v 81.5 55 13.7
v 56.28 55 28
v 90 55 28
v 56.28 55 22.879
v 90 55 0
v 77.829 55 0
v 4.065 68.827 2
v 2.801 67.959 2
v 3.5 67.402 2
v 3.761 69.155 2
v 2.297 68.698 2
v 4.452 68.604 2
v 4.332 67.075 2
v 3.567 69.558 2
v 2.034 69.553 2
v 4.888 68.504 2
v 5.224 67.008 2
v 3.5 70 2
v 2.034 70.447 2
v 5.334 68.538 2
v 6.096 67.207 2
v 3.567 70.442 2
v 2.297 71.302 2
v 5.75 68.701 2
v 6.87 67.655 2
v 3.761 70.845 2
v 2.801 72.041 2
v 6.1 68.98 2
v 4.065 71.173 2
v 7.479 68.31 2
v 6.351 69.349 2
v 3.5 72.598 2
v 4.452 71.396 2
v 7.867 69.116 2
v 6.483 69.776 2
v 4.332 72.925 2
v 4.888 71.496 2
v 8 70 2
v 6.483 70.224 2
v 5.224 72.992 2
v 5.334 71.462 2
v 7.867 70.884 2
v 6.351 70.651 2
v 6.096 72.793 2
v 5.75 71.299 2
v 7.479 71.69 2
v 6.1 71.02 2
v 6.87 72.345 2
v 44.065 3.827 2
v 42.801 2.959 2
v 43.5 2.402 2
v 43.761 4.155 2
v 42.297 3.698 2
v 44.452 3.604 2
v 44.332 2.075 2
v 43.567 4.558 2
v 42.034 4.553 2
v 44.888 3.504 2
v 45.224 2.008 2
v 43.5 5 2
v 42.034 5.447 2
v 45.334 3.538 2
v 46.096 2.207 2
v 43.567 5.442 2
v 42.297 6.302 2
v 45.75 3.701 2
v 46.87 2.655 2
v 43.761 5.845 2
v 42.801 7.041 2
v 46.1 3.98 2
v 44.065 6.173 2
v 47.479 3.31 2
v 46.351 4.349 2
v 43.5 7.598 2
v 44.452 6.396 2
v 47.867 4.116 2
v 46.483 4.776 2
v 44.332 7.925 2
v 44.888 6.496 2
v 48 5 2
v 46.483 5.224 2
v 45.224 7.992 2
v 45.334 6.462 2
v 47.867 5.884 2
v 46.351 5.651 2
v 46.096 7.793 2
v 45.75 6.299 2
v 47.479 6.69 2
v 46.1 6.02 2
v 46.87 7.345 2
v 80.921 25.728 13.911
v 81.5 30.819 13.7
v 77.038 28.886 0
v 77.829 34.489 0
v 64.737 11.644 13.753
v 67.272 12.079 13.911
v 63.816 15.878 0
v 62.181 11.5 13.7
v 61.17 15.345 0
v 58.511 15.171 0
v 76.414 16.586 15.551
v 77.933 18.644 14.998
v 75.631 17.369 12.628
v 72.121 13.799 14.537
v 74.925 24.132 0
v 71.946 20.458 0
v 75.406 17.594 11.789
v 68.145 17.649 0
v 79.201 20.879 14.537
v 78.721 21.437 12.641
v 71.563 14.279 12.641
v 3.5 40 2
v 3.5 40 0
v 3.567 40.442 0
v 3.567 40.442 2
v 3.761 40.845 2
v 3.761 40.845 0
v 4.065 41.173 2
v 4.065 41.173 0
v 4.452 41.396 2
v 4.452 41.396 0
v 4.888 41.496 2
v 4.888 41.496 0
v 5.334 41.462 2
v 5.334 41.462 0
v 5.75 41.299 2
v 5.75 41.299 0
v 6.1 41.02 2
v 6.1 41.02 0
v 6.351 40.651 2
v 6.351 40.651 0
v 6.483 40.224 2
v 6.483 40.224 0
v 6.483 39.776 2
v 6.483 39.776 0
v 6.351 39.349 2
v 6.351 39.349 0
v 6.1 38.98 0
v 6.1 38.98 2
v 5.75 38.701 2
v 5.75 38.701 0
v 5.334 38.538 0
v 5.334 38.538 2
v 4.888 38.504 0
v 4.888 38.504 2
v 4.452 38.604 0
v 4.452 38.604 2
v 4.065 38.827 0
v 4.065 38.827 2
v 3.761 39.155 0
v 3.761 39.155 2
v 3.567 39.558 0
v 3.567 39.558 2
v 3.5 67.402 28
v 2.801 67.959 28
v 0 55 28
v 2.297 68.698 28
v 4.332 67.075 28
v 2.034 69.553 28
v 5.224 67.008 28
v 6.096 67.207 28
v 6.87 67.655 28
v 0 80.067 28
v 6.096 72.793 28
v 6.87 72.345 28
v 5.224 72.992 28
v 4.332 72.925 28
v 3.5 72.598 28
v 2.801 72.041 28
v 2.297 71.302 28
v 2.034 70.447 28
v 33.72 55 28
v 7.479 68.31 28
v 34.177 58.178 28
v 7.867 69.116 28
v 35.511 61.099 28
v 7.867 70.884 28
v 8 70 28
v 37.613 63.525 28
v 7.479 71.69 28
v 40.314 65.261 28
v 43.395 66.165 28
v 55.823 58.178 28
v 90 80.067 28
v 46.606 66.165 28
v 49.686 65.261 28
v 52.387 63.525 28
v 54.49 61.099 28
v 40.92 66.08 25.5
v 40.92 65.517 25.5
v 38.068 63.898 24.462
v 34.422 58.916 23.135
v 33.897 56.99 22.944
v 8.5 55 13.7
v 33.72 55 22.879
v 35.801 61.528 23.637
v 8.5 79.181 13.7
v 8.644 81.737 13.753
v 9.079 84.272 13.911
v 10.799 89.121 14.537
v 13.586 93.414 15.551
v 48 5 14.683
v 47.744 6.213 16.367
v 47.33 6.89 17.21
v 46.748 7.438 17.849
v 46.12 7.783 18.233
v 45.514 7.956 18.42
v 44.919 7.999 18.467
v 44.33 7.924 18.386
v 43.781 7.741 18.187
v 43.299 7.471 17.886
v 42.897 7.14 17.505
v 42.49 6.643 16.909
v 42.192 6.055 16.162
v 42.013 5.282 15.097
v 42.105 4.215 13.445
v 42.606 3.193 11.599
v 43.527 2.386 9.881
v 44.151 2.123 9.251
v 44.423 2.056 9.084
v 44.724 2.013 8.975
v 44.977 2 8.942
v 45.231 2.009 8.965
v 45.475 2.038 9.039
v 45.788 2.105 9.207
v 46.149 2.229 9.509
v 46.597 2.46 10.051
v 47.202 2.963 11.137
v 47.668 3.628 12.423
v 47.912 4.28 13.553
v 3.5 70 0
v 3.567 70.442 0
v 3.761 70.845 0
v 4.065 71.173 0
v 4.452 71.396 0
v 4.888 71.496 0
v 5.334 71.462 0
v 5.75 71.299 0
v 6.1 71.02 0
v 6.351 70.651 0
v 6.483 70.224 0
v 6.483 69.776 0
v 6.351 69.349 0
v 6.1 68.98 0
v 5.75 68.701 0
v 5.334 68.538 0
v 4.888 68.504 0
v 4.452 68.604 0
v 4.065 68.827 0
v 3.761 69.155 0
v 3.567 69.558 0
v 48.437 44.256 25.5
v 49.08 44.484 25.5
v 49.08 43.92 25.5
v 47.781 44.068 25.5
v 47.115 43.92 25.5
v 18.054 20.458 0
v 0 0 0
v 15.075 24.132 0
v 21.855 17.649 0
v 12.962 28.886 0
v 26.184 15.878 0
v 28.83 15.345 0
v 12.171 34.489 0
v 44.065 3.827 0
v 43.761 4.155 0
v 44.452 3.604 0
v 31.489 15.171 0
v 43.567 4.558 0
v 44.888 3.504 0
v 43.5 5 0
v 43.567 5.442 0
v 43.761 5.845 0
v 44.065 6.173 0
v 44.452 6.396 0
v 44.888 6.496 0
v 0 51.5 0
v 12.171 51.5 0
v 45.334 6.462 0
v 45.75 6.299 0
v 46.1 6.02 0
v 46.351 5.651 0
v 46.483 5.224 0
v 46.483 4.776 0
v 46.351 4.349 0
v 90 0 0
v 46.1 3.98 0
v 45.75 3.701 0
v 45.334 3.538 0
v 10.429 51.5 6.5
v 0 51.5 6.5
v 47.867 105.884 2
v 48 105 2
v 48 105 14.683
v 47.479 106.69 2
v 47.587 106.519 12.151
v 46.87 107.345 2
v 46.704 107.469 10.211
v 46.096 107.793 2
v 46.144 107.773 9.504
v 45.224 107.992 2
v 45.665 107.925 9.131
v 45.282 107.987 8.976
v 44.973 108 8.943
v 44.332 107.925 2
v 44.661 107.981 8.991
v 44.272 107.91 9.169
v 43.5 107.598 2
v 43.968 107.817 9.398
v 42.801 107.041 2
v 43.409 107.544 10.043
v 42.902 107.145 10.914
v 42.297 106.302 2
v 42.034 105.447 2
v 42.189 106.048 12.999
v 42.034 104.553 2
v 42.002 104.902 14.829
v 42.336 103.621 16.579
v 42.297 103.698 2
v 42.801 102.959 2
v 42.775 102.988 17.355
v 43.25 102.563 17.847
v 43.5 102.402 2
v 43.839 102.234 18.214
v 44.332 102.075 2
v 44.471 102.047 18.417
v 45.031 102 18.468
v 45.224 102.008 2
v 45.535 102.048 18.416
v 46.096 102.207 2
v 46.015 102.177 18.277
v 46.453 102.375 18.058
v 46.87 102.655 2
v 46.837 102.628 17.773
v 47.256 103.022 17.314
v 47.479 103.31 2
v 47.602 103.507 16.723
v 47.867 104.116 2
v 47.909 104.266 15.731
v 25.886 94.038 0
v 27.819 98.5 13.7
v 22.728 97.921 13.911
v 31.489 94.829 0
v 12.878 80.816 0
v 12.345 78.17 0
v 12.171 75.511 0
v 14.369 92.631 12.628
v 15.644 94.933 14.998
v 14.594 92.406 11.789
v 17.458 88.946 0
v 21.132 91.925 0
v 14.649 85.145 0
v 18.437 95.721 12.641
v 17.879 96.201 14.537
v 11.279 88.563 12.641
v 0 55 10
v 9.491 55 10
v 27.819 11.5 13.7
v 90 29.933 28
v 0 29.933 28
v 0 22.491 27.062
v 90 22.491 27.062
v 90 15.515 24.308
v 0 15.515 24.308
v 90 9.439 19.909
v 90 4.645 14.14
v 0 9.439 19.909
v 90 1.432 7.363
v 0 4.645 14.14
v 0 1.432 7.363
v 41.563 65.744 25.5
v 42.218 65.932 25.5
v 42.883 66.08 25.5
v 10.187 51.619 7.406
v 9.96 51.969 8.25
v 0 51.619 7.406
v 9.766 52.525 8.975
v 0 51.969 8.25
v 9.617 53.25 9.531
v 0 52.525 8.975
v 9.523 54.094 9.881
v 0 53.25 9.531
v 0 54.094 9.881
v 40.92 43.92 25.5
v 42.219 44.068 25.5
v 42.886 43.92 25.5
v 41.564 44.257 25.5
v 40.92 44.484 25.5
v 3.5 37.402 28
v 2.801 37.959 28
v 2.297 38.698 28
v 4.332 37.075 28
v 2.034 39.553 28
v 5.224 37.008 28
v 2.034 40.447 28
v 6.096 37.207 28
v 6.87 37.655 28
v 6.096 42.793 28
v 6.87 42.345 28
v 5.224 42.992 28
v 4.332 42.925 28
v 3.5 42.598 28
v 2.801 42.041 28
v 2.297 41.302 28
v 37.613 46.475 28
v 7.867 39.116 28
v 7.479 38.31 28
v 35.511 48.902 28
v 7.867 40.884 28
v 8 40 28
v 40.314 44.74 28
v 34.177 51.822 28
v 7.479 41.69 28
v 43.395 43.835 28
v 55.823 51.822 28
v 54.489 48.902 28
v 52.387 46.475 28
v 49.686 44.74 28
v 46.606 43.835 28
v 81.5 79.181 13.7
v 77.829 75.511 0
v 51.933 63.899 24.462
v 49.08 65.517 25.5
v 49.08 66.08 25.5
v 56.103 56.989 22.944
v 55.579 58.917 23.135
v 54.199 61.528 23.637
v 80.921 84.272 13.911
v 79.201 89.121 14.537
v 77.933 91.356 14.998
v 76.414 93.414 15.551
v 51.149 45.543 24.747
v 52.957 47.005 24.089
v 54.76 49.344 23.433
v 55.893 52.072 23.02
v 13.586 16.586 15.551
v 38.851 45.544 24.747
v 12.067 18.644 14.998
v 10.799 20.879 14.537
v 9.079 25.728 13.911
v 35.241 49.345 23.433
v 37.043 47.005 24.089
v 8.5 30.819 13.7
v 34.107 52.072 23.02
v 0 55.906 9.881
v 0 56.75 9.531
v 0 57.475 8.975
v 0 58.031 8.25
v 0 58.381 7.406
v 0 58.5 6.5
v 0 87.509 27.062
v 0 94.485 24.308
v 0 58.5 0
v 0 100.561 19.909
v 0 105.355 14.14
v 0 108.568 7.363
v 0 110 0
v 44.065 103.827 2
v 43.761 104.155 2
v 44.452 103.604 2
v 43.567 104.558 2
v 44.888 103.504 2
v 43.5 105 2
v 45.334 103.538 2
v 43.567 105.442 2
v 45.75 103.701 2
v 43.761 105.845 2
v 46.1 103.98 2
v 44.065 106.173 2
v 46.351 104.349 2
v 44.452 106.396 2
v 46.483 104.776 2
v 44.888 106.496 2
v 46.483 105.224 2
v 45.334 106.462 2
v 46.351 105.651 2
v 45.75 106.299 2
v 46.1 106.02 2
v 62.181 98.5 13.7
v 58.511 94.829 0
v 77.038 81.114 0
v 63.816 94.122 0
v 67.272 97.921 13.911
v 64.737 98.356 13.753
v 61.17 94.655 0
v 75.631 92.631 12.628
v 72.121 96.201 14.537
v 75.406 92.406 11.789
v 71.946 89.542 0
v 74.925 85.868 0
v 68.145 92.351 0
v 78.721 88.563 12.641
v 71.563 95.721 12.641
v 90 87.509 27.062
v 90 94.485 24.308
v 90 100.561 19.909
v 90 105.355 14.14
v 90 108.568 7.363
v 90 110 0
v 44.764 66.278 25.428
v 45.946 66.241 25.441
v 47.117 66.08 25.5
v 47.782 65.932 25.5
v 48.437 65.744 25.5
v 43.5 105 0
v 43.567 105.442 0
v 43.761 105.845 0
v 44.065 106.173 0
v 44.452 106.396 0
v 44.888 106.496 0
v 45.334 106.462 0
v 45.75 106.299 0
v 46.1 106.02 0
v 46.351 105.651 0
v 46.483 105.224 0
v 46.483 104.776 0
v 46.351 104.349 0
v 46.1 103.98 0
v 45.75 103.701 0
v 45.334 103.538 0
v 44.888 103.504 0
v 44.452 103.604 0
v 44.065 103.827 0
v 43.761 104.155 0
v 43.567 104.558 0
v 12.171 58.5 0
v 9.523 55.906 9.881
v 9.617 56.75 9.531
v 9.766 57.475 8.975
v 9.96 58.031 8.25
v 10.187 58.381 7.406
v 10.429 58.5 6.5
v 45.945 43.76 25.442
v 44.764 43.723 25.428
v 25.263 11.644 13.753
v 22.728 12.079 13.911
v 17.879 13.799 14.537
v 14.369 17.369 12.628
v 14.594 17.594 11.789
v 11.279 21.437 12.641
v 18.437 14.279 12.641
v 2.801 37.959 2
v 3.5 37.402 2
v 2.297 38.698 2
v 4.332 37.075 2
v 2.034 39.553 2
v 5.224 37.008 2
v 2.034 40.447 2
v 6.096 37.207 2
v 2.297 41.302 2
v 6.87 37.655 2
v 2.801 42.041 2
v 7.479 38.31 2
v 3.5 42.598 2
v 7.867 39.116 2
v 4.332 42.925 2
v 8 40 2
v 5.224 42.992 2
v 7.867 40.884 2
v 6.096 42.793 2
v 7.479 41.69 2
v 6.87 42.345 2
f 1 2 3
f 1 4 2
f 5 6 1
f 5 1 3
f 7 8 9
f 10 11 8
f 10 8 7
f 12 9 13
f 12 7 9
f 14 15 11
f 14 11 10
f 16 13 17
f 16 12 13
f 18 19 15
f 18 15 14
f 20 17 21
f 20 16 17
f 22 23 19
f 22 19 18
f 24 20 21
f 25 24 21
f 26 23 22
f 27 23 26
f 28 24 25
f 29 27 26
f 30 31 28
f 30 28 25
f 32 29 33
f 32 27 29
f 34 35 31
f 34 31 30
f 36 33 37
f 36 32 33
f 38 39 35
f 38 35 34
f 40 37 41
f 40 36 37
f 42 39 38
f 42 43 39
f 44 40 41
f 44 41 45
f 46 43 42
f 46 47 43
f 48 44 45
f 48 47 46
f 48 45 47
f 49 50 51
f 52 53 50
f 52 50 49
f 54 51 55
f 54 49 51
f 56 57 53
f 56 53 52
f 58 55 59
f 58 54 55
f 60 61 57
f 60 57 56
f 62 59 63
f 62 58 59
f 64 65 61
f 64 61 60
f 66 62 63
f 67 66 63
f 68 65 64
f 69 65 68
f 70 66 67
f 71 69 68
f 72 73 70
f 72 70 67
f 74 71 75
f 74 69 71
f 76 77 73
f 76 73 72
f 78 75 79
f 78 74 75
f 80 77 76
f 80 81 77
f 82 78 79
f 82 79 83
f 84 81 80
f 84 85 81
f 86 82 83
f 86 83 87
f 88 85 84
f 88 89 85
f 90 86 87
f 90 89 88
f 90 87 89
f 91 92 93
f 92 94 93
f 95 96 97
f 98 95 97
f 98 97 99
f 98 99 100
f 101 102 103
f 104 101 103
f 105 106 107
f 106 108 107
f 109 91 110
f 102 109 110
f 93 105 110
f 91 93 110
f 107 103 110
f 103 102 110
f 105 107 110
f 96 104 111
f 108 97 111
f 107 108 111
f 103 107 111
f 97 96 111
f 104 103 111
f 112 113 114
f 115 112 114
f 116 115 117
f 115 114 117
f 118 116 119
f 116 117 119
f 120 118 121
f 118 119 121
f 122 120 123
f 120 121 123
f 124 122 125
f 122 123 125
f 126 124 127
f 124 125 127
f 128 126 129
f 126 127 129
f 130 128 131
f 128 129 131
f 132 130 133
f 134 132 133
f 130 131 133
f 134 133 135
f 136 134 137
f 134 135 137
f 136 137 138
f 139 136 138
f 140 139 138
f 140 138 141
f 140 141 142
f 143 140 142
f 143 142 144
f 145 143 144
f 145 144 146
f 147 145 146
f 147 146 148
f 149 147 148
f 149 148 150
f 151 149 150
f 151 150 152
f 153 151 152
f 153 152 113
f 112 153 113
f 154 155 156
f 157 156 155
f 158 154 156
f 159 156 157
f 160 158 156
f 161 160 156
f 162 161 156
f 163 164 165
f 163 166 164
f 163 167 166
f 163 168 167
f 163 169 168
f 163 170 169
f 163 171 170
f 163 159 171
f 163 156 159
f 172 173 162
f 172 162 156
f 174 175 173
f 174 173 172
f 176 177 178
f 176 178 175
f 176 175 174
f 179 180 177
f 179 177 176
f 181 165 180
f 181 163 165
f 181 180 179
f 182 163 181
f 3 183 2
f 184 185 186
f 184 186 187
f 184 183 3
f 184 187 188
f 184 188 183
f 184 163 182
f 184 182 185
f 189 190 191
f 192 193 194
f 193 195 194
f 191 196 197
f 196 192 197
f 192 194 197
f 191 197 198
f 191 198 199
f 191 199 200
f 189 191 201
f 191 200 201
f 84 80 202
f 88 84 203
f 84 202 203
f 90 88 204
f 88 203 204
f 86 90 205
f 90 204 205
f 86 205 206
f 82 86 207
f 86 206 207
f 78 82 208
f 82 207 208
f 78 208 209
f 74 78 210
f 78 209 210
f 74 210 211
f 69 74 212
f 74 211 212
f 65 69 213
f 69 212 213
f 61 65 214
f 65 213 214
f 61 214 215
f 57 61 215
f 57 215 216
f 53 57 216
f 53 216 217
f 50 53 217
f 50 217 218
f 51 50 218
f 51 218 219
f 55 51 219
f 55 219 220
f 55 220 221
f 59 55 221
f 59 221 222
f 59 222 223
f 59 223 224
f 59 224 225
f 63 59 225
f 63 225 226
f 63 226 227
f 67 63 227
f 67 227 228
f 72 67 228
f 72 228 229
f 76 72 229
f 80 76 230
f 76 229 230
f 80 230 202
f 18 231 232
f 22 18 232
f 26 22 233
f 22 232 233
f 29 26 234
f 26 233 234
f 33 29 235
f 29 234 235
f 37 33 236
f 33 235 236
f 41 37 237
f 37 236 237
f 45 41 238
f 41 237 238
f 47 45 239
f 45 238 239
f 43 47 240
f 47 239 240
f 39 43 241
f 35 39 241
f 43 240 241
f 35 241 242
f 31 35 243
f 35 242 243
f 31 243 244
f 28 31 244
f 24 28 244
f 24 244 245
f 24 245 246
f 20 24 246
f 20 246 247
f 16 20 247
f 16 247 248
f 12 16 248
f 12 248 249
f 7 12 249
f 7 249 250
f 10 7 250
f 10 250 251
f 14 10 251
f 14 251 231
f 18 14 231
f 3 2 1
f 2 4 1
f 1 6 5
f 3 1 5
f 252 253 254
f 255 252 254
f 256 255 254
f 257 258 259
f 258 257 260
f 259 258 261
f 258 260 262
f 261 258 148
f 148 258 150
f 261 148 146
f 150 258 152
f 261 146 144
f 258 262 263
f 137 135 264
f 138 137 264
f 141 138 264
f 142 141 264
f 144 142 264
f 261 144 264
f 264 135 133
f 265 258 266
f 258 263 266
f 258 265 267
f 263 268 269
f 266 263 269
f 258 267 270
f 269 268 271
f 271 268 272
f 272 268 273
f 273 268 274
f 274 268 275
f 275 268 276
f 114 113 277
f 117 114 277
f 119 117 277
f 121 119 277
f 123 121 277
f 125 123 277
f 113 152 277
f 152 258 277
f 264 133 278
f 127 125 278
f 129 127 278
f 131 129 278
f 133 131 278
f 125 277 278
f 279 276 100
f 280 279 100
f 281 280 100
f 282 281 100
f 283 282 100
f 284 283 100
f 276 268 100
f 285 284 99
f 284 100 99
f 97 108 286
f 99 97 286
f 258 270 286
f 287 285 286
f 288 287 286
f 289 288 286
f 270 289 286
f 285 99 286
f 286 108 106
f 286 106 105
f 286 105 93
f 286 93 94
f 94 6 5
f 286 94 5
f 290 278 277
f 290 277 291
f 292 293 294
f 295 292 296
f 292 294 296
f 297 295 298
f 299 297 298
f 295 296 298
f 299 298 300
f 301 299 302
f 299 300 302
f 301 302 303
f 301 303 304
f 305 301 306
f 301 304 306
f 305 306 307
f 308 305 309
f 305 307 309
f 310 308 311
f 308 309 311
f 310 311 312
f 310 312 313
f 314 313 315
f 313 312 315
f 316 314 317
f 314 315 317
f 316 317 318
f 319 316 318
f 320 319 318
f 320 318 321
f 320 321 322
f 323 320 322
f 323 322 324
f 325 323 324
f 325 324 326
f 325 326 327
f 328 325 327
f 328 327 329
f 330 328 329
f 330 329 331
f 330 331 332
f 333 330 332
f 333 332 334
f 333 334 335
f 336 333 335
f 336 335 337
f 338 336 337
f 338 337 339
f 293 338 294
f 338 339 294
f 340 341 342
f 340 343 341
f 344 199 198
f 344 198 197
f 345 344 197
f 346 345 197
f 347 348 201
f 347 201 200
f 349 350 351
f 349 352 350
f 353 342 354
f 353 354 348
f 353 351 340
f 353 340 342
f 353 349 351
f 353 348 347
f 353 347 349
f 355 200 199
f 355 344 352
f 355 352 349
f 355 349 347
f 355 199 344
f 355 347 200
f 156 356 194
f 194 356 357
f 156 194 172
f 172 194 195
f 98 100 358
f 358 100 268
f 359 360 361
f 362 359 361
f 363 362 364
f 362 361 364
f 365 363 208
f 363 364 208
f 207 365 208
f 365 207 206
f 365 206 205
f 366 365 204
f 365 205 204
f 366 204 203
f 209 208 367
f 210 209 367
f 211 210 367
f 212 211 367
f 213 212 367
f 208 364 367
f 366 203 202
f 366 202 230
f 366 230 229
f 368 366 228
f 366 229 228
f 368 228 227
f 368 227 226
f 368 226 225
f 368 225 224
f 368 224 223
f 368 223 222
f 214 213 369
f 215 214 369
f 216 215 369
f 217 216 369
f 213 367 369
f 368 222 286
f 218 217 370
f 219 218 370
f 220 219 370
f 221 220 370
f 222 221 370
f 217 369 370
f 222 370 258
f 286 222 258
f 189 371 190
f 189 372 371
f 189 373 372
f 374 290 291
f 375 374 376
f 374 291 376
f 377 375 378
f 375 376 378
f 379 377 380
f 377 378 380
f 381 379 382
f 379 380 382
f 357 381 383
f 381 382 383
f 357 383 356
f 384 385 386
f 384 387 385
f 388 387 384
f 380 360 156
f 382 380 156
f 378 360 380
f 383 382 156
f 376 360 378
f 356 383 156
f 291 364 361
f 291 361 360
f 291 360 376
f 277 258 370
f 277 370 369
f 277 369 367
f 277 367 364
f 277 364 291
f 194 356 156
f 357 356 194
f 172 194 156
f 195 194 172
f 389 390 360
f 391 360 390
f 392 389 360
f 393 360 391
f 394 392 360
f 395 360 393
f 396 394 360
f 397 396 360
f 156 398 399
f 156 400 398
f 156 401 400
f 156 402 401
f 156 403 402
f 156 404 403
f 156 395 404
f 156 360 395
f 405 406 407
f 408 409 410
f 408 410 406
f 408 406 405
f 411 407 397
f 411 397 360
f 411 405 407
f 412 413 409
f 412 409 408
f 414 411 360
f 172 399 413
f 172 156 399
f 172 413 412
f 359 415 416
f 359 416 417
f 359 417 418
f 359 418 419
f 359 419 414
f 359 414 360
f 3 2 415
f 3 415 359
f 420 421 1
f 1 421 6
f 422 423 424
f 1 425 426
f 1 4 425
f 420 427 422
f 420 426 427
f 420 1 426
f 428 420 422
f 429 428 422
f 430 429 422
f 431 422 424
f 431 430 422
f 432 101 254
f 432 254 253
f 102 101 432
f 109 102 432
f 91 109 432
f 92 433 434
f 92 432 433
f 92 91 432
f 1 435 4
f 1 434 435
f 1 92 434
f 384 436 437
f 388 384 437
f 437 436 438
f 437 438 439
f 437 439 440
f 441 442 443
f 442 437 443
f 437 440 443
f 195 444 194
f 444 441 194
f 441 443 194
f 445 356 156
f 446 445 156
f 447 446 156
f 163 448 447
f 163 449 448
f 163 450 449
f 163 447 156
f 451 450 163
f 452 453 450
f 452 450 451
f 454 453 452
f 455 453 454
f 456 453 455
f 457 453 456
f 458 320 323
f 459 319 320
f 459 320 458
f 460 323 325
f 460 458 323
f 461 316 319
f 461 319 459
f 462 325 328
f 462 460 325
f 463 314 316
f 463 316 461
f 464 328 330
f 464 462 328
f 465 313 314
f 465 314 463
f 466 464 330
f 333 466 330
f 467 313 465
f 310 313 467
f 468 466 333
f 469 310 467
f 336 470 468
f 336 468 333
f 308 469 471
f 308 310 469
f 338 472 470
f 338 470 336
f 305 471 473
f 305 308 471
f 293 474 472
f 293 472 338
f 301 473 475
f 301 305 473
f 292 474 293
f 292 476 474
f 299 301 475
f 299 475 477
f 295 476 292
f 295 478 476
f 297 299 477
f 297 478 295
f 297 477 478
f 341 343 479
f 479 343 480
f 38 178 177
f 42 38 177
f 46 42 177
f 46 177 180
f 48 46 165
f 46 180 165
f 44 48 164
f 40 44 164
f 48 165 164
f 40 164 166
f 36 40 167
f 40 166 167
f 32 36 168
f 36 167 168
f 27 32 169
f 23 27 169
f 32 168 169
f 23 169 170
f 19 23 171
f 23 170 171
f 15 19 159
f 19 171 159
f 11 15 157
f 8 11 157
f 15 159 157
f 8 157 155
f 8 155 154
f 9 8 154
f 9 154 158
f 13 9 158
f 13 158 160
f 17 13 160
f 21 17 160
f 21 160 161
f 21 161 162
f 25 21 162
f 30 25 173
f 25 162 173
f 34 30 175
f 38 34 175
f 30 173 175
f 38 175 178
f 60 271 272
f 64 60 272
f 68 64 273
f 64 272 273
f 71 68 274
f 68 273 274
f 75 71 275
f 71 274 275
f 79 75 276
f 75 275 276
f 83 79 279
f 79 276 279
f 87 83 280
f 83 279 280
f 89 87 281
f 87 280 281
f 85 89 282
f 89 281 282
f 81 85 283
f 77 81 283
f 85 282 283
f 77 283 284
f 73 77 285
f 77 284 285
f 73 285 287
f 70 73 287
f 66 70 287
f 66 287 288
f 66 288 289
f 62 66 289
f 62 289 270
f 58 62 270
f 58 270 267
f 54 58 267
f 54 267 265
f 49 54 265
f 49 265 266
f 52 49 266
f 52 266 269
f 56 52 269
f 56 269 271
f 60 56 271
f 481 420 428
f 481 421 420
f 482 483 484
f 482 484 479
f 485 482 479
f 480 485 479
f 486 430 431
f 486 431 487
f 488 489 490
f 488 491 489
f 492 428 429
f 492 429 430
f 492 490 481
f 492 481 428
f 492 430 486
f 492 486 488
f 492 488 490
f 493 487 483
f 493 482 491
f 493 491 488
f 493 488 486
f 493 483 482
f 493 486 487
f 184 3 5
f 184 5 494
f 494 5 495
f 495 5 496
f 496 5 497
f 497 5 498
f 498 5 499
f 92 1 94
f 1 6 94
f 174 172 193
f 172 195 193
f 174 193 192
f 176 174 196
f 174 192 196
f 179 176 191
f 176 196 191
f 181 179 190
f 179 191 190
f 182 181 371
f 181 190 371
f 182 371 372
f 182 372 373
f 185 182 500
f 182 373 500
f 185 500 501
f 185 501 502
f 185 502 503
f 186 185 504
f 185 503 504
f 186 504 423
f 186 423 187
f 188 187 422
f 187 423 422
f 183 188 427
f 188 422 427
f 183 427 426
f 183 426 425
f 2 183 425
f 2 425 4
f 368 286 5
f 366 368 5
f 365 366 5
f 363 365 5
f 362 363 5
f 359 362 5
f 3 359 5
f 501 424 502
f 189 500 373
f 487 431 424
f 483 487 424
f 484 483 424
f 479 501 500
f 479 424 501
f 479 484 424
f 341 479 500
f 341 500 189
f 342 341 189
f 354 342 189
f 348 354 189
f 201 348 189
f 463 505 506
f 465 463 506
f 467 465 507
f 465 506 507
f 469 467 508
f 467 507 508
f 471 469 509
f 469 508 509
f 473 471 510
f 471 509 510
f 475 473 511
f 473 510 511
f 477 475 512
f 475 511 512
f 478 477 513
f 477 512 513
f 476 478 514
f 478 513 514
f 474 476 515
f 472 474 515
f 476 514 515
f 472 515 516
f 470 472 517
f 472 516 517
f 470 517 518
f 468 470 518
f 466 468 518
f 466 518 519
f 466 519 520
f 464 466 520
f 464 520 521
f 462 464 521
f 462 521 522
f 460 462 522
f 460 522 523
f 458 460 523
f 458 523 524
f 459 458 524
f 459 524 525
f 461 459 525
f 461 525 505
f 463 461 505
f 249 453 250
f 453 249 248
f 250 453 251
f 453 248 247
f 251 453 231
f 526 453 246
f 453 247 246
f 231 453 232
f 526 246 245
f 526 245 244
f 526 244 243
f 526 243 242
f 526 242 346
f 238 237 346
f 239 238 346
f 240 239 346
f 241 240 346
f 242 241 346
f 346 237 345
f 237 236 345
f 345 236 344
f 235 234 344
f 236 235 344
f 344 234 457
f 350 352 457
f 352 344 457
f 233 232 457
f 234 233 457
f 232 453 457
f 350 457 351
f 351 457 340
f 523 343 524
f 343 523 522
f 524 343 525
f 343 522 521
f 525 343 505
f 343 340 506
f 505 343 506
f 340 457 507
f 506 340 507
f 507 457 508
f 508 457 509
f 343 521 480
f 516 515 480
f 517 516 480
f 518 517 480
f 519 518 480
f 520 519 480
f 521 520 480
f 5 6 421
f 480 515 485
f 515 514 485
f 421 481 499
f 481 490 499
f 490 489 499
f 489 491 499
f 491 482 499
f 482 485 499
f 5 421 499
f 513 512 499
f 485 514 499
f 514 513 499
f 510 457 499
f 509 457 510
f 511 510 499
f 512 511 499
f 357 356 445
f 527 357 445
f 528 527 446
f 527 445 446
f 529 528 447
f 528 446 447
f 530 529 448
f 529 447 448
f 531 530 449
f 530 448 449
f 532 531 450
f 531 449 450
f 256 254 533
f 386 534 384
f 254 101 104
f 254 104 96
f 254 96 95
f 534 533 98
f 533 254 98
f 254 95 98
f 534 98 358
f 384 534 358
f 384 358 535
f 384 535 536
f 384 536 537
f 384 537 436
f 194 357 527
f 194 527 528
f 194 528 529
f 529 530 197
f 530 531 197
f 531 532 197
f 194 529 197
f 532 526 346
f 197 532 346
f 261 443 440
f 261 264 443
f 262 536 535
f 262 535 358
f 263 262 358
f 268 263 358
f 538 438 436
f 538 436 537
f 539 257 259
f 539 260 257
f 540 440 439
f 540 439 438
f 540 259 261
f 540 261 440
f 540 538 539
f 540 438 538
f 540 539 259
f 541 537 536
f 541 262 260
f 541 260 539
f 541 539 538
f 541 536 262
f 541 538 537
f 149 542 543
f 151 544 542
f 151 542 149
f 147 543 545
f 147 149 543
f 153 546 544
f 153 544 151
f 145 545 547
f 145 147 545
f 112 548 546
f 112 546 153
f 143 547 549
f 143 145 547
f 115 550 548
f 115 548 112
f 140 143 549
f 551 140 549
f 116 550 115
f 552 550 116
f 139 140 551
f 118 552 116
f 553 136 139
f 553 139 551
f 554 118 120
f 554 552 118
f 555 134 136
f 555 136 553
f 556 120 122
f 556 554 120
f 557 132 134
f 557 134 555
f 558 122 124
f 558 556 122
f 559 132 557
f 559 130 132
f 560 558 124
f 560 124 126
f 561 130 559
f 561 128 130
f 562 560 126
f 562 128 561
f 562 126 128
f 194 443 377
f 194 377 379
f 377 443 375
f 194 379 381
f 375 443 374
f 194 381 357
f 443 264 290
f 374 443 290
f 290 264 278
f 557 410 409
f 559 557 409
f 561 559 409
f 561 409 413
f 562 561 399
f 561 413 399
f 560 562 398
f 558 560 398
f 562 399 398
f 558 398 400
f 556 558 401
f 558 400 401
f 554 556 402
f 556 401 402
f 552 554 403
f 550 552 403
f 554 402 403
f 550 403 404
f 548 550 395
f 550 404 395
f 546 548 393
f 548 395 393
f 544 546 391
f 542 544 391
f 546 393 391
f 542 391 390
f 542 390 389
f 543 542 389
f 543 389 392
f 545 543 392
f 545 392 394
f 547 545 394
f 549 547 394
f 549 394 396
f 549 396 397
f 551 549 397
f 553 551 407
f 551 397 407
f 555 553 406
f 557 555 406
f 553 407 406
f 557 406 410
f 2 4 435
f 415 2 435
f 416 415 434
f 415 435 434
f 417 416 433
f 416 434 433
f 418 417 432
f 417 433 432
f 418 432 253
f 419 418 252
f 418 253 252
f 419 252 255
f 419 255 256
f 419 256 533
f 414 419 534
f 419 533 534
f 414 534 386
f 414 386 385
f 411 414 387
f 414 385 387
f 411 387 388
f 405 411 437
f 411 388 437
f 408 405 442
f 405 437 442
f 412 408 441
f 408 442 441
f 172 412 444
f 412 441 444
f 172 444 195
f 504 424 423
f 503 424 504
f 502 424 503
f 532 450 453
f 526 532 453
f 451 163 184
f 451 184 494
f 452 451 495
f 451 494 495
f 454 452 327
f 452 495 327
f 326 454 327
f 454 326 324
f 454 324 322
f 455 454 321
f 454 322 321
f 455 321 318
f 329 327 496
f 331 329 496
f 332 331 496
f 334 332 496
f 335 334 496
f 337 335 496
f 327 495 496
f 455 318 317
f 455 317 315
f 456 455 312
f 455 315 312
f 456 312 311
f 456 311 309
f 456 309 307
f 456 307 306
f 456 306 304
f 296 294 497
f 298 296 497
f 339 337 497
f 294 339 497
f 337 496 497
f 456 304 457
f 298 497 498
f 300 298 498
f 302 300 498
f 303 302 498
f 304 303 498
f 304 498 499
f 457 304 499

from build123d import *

# Parameters (mm, degrees)
SKETCH1_W           = 90
SKETCH1_H           = 110
BOSS_EXTRUDE1_DEPTH = 28
FILLET2_R           = 30
SKETCH3_R           = 1.5
CUT_EXTRUDE1_DEPTH  = 145.858551698
SKETCH4_R           = 3
CUT_EXTRUDE4_DEPTH  = 26
CUT_EXTRUDE5_START  = -13.7
SKETCH5_W           = 73
SKETCH5_H           = 87
CUT_EXTRUDE5_DEPTH  = 13.7
CUT_EXTRUDE5_TAPER  = 15
SKETCH8_W           = 73
SKETCH8_H           = 87
CUT_EXTRUDE8_DEPTH  = 11.8
CUT_EXTRUDE8_DRAFT  = -70
CUT_EXTRUDE9_START  = 30
SKETCH9_R           = 11.28
CUT_EXTRUDE9_DEPTH  = 61.8
FILLET19_R          = 20
CUT_EXTRUDE10_START = 54.999995
CUT_EXTRUDE10_DEPTH = 0.0001
CUT_EXTRUDE12_REACH = 146.859


# Read off the part's stored shape, not the designer's step: Cut-Extrude10
with BuildPart() as part:
    # Sketch1 → Boss-Extrude1 (new body)
    with BuildSketch(Plane.XY):
        with Locations((45, 55)):
            Rectangle(SKETCH1_W, SKETCH1_H)
    extrude(amount=BOSS_EXTRUDE1_DEPTH)

    # Fillet2
    # the kernel refuses this fillet: 30 mm, written as the material it takes off along each edge
    with BuildSketch(Plane(origin=(-74.833147735, 0, 28), x_dir=(0, 0, -1), z_dir=(1, 0, 0)), Plane(origin=(164.833147735, 110, 28), x_dir=(0, 0, -1), z_dir=(-1, 0, 0))) as fillet2_piece_1:
        with BuildLine():
            CenterArc((30, 29.933259094), FILLET2_R, 180, 86.177446271)
            Line((0, 29.933259094), (-0.6, 29.933259094))
            Line((-0.6, 29.933259094), (-0.6, 0))
            Line((-0.6, 0), (0, -0.6))
            ThreePointArc((0, -0.6), (14, -0.6), (27.96, -0.598665182))
            Line((27.96, -0.598665182), (28, 0))
        make_face()
    extrude(amount=239.666295471, mode=Mode.SUBTRACT)

    # Sketch3 → Cut-Extrude1 (cut, through all)
    with BuildSketch(Plane(origin=(0, 0, 0), x_dir=(-1, 0, 0), z_dir=(0, 0, -1))):
        with Locations((-45, 105)):
            Circle(SKETCH3_R)
        with Locations((-45, 5)):
            Circle(SKETCH3_R)
        with Locations((-5, 70)):
            Circle(SKETCH3_R)
        with Locations((-5, 40)):
            Circle(SKETCH3_R)
    extrude(amount=-CUT_EXTRUDE1_DEPTH, mode=Mode.SUBTRACT)

    # Sketch4 → Cut-Extrude4 (cut)
    with BuildSketch(Plane.XY.offset(28)):
        with Locations((45, 105)):
            Circle(SKETCH4_R)
        with Locations((45, 5)):
            Circle(SKETCH4_R)
        with Locations((5, 70)):
            Circle(SKETCH4_R)
        with Locations((5, 40)):
            Circle(SKETCH4_R)
    extrude(amount=-CUT_EXTRUDE4_DEPTH, mode=Mode.SUBTRACT)

    # Sketch5 → Cut-Extrude5 (cut)
    with BuildSketch(Plane(origin=(0, 0, 0), x_dir=(-1, 0, 0), z_dir=(0, 0, -1)).offset(CUT_EXTRUDE5_START)):
        with Locations((-45, 55)):
            Rectangle(SKETCH5_W, SKETCH5_H)
    extrude(amount=CUT_EXTRUDE5_DEPTH, taper=CUT_EXTRUDE5_TAPER, mode=Mode.SUBTRACT)


with BuildPart() as cut_extrude8_tool:
    # Sketch8 → Cut-Extrude8 (with draft: the straight prism first)
    with BuildSketch(Plane(origin=(0, 0, 13.7), x_dir=(-1, 0, 0), z_dir=(0, 0, -1))):
        with Locations((-45, 55)):
            Rectangle(SKETCH8_W, SKETCH8_H)
    extrude(amount=-CUT_EXTRUDE8_DEPTH)
    # Cut-Extrude8: the draft: its side faces are tilted about the plane it starts from
    cut_extrude8_sides = [cut_extrude8_tool.faces().sort_by_distance(p)[0] for p in [
        (81.5, 55, 19.6),
        (45, 11.5, 19.6),
        (8.5, 55, 19.6),
        (45, 98.5, 19.6),
    ]]
    draft(cut_extrude8_sides, Plane(origin=(0, 0, 13.7), x_dir=(-1, 0, 0), z_dir=(0, 0, -1)), CUT_EXTRUDE8_DRAFT)


with BuildPart() as part_1:
    add(part.part)

    # Cut-Extrude8: cut by cut_extrude8_tool
    add(cut_extrude8_tool.part, mode=Mode.SUBTRACT)

    # Sketch9 → Cut-Extrude9 (cut)
    with BuildSketch(Plane(origin=(0, 0, 25.5), x_dir=(-1, 0, 0), z_dir=(0, 0, -1)).offset(CUT_EXTRUDE9_START)):
        with Locations((-45.00023355, 55.00023355)):
            Circle(SKETCH9_R)
    extrude(amount=-CUT_EXTRUDE9_DEPTH, mode=Mode.SUBTRACT)

    # Fillet19
    fillet19_edges = [part_1.edges().sort_by_distance(p)[0] for p in [
        (79.664548032, 96.664548032, 6.85),
        (79.664548032, 13.335451968, 6.85),
        (10.335451968, 13.335451968, 6.85),
        (10.335451968, 96.664548032, 6.85),
    ]]
    fillet(fillet19_edges, radius=FILLET19_R)

    # Cut-Extrude10 outline → Cut-Extrude10 (cut)
    with BuildSketch(Plane(origin=(0, 0, 0), x_dir=(1, 0, 0), z_dir=(0, 1, 0)).offset(CUT_EXTRUDE10_START)):
        Polygon((90, -28), (90, 0), (77.829096064, 0), (12.170903936, 0), (0, 0), (0, -28), align=None)
    extrude(amount=CUT_EXTRUDE10_DEPTH, mode=Mode.SUBTRACT)

    # Cut-Extrude12: up to this plane
    cut_extrude12_end = Plane(origin=(8.5, 11.5, 13.7), z_dir=(-0.9659258262890681, 0, -0.25881904510252135))
    # Sketch14 → Cut-Extrude12 (cut, up to the surface)
    with BuildSketch(Plane.ZY, mode=Mode.PRIVATE) as cut_extrude12_sk1:
        with BuildLine():
            Line((6.5, 58.5), (0, 58.5))
            Line((0, 58.5), (0, 51.5))
            Line((0, 51.5), (6.5, 51.5))
            ThreePointArc((6.5, 51.5), (10, 55), (6.5, 58.5))
        make_face()
    cut_extrude12_tool1 = split(extrude(cut_extrude12_sk1.sketch, amount=-CUT_EXTRUDE12_REACH, mode=Mode.PRIVATE), bisect_by=cut_extrude12_end, keep=Keep.BOTH, mode=Mode.PRIVATE)
    add(cut_extrude12_tool1.solids().sort_by_distance((0, 55, 4.657437))[0], mode=Mode.SUBTRACT)


solid = part_1.part
